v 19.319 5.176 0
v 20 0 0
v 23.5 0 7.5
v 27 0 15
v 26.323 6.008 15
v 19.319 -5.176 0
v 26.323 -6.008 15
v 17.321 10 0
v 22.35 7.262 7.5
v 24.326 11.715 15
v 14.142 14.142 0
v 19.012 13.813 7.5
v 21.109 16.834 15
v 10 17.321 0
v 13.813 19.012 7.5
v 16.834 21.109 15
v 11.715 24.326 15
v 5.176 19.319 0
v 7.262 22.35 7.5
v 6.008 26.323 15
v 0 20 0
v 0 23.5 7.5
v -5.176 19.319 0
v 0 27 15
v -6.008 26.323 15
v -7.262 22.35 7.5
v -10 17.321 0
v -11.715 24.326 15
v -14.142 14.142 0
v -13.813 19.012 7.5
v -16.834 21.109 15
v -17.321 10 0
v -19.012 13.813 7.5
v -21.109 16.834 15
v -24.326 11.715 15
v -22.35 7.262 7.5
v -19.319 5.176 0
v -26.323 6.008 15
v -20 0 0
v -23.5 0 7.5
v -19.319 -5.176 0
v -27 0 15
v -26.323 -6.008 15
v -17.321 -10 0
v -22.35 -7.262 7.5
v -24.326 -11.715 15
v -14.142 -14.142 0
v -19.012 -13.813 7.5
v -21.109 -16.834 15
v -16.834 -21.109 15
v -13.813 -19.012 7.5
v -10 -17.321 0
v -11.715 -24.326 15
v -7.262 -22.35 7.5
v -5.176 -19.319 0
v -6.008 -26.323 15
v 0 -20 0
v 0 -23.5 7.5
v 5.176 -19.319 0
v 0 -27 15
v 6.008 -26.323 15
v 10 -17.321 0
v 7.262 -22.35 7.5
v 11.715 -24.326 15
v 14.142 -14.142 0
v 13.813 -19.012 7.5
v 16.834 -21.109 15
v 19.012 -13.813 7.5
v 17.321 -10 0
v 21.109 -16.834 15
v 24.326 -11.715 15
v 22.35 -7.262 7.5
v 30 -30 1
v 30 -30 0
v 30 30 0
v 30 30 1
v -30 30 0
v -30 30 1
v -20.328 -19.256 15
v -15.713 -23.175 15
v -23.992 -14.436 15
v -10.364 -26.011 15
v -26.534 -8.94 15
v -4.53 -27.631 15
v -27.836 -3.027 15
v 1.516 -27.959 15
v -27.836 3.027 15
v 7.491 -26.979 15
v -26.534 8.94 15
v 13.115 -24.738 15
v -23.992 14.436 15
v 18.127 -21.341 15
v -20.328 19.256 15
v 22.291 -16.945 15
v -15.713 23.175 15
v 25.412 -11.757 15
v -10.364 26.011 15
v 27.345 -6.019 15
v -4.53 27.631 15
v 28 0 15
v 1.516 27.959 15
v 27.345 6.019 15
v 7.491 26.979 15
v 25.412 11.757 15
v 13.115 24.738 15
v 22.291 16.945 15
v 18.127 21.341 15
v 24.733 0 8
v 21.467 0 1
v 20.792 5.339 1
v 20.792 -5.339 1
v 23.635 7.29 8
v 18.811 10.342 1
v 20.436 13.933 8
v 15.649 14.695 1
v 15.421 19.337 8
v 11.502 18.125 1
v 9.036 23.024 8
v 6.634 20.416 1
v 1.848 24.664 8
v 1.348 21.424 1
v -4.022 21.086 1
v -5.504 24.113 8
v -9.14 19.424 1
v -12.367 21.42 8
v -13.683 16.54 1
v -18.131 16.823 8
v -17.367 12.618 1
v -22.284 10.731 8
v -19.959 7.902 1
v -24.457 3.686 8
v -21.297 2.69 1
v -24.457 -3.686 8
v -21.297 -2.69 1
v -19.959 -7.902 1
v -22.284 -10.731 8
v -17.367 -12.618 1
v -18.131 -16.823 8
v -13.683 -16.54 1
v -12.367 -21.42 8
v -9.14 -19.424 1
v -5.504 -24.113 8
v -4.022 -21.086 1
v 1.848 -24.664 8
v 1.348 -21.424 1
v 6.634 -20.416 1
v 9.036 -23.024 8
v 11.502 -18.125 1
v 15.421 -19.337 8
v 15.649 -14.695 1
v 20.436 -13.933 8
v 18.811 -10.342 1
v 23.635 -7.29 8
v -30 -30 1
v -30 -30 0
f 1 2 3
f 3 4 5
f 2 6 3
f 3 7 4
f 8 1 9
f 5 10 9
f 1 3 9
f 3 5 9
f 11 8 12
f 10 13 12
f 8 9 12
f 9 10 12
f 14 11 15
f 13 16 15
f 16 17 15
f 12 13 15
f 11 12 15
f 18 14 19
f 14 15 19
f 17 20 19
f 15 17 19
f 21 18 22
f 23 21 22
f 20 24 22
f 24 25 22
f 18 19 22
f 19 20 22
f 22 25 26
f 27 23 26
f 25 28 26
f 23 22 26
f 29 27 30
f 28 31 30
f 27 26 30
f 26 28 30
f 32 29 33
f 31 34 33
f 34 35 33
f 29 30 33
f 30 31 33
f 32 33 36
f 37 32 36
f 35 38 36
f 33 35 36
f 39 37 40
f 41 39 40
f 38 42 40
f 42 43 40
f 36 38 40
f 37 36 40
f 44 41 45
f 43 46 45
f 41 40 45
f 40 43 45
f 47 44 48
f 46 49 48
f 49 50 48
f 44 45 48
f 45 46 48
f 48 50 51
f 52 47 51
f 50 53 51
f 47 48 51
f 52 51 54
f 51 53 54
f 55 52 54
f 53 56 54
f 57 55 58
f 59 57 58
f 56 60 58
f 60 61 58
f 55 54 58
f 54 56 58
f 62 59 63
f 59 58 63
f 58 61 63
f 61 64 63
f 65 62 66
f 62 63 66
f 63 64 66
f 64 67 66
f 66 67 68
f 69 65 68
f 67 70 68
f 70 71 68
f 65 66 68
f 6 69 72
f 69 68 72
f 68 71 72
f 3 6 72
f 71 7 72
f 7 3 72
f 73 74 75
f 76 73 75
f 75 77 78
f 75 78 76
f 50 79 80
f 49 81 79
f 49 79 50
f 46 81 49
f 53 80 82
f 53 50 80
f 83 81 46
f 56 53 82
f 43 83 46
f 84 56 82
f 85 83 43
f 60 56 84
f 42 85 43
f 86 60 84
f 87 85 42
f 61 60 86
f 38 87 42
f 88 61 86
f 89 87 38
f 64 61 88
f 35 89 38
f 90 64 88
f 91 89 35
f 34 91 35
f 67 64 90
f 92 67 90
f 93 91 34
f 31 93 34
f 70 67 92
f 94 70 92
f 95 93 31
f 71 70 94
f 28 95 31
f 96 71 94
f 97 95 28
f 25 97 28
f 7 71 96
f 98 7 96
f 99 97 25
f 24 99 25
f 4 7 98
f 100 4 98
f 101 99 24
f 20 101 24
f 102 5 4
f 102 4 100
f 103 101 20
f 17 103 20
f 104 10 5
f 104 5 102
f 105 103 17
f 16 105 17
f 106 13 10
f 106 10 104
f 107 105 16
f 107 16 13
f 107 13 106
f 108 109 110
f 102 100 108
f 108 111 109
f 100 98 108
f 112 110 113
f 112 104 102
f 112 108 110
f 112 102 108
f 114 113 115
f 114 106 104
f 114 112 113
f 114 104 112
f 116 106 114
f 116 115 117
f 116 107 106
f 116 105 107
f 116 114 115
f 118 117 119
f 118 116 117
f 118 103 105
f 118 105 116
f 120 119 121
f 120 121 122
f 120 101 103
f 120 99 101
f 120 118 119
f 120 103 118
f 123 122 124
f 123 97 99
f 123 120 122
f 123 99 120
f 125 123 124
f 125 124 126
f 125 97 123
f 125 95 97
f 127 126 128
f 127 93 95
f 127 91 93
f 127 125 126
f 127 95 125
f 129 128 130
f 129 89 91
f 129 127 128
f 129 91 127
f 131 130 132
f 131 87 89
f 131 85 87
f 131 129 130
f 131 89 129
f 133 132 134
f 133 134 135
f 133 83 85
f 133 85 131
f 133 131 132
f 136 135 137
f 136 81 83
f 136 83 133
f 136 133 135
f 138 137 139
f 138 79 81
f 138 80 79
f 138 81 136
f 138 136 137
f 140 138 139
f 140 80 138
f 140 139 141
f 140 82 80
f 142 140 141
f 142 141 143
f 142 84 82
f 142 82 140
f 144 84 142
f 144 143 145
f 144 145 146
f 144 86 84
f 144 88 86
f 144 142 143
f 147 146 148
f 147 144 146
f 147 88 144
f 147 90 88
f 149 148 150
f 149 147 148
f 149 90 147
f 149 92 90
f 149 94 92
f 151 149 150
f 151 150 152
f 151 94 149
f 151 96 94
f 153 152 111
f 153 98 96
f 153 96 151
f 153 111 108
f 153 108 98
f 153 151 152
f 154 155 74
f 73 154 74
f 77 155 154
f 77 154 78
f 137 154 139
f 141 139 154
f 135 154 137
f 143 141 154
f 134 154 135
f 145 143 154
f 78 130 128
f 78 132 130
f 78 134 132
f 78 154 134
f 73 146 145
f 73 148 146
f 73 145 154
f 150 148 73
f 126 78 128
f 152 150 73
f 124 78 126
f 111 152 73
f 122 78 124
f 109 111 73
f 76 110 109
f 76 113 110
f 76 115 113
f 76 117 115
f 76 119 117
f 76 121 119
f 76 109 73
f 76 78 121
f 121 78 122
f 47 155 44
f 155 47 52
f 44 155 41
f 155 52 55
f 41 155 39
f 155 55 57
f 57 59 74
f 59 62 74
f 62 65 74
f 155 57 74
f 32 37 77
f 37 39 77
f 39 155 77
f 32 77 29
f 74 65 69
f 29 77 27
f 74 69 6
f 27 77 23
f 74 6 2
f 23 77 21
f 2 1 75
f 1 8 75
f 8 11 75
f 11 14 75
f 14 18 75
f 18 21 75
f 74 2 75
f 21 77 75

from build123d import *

# Parameters (mm, degrees)
SKETCH_W  = 60
SKETCH_H  = 60
SKETCH_R  = 21
PAD_DEPTH = 1


with BuildPart() as pad:
    # Sketch → Pad (new body)
    with BuildSketch(Plane.XY):
        Rectangle(SKETCH_W, SKETCH_H)
        Circle(SKETCH_R, mode=Mode.SUBTRACT)
    extrude(amount=PAD_DEPTH)


with BuildPart() as cone:
    # Cone → Cone (revolve)
    with BuildSketch(Plane.XZ):
        Polygon((0, 0), (20, 0), (27, 15), (0, 15), align=None)
    revolve(axis=Axis((0, 0, 0), (0, 0, 1)))


with BuildPart() as fusion:
    # Cone001 → Cone001 (revolve)
    with BuildSketch(Plane.XZ):
        Polygon((0, 0), (21, 0), (28, 15), (0, 15), align=None)
    revolve(axis=Axis((0, 0, 0), (0, 0, 1)))

    # Cut: cut Cone
    add(cone.part, mode=Mode.SUBTRACT)

    # Fusion: union Pad
    add(pad.part)


solid = fusion.part
